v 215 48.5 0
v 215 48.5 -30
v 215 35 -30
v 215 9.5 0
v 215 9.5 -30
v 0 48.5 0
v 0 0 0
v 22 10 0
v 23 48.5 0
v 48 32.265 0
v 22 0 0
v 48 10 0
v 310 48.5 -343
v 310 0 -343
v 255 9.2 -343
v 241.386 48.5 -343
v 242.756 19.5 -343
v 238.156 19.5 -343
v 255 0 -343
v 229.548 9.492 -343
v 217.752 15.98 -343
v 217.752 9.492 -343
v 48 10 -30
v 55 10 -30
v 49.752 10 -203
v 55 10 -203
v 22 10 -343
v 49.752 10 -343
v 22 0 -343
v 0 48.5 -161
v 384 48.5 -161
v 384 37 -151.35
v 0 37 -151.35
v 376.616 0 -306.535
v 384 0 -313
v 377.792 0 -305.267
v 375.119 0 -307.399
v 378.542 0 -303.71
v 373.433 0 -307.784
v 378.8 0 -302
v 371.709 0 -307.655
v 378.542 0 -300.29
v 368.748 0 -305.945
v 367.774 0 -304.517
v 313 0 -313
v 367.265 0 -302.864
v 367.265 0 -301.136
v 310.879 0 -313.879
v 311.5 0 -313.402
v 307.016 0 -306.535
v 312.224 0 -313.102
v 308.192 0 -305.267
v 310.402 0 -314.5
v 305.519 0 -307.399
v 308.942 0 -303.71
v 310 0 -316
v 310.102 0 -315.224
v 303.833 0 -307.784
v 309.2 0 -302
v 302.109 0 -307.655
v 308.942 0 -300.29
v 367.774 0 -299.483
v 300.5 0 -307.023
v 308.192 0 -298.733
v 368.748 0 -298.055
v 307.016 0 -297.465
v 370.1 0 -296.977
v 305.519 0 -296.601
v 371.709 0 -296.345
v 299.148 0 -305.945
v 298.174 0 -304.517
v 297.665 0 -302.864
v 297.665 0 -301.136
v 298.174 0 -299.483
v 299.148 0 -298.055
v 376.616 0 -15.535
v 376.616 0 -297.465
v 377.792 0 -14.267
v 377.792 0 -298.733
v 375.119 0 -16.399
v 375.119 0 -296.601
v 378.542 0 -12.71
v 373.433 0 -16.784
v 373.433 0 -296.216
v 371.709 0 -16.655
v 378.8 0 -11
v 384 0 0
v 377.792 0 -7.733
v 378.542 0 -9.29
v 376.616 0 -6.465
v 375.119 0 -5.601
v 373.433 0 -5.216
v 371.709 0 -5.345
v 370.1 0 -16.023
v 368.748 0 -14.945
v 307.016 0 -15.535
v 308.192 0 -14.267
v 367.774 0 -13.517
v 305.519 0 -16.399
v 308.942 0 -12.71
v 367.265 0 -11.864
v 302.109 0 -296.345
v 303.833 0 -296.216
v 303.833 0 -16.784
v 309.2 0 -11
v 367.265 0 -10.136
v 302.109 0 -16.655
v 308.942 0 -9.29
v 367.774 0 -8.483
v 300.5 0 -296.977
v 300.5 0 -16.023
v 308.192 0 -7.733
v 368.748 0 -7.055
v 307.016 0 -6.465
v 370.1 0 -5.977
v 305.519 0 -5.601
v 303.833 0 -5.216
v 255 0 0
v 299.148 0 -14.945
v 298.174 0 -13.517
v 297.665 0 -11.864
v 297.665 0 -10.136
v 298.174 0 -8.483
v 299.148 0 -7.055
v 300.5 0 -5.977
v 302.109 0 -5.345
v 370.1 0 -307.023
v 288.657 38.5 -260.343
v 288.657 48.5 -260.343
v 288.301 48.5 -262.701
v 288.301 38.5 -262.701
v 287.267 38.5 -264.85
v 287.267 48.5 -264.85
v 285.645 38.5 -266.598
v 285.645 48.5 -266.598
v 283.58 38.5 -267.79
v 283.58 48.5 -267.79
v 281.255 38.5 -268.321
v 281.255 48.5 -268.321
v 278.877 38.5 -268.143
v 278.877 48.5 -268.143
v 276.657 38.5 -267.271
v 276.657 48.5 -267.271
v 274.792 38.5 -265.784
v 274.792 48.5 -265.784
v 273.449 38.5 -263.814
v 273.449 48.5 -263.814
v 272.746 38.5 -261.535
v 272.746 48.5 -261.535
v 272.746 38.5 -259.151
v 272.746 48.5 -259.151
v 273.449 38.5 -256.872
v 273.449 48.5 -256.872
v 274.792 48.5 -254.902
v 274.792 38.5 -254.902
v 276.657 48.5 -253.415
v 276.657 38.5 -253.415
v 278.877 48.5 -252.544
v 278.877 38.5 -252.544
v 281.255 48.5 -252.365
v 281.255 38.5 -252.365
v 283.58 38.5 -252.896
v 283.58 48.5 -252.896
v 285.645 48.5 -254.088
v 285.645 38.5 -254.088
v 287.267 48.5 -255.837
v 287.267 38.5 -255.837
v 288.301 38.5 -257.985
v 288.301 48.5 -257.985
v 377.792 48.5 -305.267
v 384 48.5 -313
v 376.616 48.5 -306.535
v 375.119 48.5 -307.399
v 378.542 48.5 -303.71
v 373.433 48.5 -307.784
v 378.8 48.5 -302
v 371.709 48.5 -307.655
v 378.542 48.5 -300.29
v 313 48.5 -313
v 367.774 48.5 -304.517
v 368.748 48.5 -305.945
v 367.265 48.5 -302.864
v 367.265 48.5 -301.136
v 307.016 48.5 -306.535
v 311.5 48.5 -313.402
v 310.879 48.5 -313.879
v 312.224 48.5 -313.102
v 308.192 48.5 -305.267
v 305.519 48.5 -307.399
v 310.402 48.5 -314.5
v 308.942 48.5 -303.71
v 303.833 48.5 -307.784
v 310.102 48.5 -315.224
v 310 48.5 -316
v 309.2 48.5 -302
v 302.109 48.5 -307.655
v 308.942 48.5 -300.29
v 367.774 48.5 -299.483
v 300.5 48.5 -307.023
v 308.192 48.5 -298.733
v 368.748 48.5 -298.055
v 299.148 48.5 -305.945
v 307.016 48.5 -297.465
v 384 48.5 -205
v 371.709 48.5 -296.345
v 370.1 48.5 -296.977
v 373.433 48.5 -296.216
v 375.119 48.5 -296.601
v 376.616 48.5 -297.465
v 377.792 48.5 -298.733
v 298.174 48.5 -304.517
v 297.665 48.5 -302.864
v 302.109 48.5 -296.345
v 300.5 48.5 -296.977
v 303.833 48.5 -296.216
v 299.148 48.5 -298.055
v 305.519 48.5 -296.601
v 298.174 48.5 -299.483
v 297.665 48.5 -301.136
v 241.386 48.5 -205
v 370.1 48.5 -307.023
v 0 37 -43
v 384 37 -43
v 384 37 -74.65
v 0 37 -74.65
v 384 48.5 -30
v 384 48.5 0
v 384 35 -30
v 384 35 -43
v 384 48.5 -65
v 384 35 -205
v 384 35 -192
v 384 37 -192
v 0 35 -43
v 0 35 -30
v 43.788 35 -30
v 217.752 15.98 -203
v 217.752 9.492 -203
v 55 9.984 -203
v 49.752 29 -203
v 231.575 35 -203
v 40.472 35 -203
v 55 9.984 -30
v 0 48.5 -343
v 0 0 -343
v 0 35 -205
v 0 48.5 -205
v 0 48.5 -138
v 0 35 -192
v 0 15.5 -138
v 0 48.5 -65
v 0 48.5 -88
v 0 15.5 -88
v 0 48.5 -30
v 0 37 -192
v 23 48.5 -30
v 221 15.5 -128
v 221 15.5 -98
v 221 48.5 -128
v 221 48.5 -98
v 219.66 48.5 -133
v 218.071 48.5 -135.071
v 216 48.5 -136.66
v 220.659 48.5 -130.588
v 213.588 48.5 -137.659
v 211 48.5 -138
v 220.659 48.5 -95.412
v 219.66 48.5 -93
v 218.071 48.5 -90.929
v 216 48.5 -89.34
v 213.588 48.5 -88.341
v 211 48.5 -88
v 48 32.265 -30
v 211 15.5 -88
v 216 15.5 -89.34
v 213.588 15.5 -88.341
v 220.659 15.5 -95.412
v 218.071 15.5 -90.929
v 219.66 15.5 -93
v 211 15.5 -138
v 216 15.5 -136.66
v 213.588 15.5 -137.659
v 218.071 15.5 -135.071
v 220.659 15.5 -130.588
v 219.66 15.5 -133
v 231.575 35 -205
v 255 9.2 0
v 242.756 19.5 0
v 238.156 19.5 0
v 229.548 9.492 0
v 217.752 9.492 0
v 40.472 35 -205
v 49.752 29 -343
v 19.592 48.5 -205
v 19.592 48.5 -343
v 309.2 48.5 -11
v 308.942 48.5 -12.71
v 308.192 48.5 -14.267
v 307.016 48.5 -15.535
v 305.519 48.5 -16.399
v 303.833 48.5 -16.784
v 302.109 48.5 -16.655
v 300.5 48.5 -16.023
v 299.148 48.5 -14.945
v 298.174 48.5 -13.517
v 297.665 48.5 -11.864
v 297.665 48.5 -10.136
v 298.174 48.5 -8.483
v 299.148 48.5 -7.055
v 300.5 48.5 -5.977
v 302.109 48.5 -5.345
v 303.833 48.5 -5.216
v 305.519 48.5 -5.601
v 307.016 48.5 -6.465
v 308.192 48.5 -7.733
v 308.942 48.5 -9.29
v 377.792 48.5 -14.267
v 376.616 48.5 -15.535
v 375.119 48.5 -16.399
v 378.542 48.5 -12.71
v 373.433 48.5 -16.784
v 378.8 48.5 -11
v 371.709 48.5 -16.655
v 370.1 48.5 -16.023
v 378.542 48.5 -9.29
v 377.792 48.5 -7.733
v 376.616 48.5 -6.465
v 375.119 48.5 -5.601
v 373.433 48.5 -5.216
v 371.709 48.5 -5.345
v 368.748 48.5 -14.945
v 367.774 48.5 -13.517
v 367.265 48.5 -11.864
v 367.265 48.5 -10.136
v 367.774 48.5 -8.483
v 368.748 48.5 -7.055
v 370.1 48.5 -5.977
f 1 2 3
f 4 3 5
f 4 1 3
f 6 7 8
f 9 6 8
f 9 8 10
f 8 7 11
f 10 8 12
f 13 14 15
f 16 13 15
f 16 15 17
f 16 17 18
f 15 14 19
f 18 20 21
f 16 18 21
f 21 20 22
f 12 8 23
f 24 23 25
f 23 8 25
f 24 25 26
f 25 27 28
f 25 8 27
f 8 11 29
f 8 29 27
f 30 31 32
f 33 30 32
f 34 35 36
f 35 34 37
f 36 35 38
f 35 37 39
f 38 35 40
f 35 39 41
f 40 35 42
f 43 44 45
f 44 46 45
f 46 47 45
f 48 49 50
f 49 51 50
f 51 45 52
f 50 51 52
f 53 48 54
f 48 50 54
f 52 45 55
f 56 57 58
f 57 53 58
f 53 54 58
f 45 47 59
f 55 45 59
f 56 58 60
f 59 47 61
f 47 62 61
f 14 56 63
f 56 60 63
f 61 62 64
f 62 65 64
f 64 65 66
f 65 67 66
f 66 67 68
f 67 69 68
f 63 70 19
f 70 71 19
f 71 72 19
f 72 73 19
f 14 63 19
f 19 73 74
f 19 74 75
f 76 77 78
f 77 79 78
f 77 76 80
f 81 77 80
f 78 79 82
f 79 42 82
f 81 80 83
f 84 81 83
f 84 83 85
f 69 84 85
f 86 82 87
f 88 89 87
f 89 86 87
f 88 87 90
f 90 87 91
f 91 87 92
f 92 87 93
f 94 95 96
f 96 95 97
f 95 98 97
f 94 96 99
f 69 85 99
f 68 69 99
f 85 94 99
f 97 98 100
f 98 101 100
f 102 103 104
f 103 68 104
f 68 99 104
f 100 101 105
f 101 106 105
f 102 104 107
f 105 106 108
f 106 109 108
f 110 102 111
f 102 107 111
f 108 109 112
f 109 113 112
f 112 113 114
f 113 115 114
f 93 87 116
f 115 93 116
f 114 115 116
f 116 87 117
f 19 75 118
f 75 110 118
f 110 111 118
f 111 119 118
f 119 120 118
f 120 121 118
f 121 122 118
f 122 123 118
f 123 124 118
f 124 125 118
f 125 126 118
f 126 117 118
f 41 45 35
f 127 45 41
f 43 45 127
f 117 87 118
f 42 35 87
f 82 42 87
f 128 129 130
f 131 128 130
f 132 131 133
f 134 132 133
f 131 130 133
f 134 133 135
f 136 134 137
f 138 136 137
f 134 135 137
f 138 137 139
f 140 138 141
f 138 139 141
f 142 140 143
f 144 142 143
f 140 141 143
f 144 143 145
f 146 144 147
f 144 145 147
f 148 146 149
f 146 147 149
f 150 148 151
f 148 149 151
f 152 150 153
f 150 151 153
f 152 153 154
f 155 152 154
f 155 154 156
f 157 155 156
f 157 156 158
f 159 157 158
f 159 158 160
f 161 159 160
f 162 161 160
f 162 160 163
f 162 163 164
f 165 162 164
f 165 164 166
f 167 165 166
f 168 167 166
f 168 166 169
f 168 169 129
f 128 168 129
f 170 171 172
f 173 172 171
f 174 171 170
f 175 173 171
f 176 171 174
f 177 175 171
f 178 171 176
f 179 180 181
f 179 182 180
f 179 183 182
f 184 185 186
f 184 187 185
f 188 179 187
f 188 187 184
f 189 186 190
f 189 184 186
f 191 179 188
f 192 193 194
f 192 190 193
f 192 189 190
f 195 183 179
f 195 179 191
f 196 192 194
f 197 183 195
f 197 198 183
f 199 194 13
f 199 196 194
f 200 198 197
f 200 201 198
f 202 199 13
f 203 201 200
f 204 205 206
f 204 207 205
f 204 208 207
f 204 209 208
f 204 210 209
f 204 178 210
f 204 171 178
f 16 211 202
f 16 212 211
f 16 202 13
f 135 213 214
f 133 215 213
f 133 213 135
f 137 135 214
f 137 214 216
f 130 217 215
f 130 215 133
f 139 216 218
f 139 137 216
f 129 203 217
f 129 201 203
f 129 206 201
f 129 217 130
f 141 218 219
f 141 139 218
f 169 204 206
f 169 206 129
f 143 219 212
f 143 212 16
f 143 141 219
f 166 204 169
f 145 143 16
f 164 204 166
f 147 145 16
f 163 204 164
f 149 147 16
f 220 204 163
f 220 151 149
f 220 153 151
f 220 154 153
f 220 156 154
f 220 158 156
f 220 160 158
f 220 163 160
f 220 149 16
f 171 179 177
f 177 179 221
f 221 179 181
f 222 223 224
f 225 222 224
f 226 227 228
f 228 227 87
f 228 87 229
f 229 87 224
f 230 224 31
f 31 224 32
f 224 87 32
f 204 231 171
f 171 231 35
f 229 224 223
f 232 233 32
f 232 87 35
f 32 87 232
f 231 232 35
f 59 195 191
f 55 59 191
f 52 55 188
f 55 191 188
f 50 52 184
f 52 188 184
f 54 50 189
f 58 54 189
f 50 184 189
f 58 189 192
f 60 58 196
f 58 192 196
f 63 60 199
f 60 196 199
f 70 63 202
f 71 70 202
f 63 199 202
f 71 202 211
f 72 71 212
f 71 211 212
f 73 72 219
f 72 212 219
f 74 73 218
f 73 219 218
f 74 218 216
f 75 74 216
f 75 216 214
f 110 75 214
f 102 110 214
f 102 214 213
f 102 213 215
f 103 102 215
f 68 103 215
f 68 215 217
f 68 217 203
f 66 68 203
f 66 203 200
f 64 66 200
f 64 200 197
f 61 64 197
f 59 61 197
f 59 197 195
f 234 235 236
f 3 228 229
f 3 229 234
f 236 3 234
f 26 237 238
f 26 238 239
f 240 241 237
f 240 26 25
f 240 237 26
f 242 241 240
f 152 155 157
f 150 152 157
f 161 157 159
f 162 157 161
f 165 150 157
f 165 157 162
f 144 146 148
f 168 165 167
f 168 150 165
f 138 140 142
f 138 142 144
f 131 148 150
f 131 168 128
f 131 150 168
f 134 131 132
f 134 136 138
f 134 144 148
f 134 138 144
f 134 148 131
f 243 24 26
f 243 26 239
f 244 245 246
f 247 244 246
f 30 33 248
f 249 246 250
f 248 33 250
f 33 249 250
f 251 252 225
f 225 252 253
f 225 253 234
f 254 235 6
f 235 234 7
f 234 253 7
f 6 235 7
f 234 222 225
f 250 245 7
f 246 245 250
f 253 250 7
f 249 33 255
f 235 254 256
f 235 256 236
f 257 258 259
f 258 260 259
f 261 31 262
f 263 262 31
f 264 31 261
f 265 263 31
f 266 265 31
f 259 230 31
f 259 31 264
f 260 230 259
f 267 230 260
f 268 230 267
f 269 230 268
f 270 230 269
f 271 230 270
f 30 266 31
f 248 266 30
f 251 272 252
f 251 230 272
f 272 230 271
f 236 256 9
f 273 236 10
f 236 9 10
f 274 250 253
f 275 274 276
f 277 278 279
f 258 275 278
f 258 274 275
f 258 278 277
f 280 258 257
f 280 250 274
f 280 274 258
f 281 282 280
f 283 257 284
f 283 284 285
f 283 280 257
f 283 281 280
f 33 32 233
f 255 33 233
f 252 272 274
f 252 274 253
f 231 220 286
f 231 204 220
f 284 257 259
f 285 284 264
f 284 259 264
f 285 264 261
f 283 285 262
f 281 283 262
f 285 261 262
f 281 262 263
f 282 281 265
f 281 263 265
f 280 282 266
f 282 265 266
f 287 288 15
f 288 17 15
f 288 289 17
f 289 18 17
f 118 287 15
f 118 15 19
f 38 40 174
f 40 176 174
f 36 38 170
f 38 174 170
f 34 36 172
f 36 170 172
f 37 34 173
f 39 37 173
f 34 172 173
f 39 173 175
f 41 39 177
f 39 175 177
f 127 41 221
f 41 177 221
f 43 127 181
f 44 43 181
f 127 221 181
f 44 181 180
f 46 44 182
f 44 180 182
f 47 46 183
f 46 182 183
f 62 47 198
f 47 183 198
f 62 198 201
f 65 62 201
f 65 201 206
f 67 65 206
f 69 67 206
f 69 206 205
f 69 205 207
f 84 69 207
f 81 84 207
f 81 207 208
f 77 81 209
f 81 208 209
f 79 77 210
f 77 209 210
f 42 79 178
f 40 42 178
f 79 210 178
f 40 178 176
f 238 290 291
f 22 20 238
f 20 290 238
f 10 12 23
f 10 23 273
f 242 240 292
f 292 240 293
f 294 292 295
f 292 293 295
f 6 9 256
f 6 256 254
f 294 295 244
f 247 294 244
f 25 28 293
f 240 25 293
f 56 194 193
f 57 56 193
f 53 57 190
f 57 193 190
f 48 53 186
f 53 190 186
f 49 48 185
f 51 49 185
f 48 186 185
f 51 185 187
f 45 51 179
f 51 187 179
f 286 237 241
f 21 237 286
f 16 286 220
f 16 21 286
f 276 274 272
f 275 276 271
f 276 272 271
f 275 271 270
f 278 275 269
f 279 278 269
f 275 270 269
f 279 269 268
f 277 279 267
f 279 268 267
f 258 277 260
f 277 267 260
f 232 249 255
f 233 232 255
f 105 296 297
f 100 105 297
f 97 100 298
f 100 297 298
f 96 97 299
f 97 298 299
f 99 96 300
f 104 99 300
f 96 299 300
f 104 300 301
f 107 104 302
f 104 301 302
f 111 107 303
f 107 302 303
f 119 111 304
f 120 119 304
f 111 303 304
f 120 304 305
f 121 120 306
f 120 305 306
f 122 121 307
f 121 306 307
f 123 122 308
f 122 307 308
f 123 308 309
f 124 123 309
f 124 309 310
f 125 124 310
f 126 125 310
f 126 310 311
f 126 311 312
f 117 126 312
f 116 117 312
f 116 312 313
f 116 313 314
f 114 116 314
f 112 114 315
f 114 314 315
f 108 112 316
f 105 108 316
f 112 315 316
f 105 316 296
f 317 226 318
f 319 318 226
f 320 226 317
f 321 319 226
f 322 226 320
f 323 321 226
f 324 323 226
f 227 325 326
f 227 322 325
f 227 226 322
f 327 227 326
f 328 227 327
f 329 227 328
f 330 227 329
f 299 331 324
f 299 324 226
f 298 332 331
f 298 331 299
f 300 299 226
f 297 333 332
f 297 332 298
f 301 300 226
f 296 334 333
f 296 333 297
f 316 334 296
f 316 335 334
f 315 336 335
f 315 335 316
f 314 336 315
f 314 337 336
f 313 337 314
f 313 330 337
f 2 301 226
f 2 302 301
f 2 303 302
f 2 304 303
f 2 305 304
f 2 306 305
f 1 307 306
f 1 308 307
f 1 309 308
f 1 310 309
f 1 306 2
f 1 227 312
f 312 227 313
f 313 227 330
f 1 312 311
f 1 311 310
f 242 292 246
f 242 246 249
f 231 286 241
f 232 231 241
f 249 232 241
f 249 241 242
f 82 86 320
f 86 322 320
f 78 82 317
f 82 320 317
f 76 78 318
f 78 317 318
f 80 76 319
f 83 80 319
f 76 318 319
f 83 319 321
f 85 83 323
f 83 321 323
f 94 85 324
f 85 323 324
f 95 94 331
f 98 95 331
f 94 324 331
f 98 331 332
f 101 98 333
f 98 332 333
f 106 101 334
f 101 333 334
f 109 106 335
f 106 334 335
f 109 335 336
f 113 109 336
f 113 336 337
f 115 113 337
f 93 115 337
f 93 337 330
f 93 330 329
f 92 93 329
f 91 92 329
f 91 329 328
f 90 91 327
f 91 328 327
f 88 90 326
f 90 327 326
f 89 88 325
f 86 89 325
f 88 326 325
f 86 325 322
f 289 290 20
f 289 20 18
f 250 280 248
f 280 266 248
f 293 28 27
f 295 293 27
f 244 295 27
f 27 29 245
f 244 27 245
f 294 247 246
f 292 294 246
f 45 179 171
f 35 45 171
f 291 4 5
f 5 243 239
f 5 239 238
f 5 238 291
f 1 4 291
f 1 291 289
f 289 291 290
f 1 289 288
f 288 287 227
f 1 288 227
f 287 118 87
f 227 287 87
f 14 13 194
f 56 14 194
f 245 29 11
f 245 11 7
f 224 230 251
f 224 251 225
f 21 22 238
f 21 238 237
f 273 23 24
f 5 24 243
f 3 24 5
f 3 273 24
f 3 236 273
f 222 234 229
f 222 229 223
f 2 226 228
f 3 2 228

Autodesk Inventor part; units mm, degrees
ref_plane "YZ Plane" through (0, 0, 0) normal (1, 0, 0) x (0, 1, 0)
ref_plane "XZ Plane" through (0, 0, 0) normal (0, 1, 0) x (-1, 0, 0)
ref_plane "XY Plane" through (0, 0, 0) normal (0, 0, 1) x (1, 0, 0)
sketch "Sketch1" plane through (0, 0, 0) normal (0, 1, 0) x (-1, 0, 0)
  line L0 (0, 0) -> (-384, 0)
  line L1 (-384, 0) -> (-384, -343)
  line L2 (-384, -343) -> (0, -343)
  line L3 (0, -343) -> (0, 0)
  dimension "d0" = 384
  dimension "d1" = 343
extrude "Extrusion1" add sketch "Sketch1" along normal blind 48.5
sketch "Sketch3" plane through (384, 0, 0) normal (1, 0, 0) x (0, 0, -1)
  line L0 (0, 0) -> (343, 0) projected
  line L1 (0, 0) -> (0, 48.5) projected
  line L2 (343, 0) -> (343, 48.5) projected
  line L3 (30, 48.5) -> (65, 48.5)
  line L4 (30, 48.5) -> (30, 37)
  line L5 (65, 48.5) -> (74.6496, 37)
  line L6 (43, 37) -> (74.6496, 37)
  line L7 (30, 37) -> (30, 35)
  line L8 (30, 35) -> (43, 35)
  line L9 (43, 35) -> (43, 37)
  dimension "d23" = 35
  dimension "d37" = 2
  dimension "d38" = 13
extrude "Extrusion2" cut sketch "Sketch3" against normal through all
sketch "Sketch7" plane through (384, 0, 0) normal (1, 0, 0) x (0, 0, -1)
  line L0 (65, 48.5) -> (343, 48.5) projected
  line L1 (65, 48.5) -> (161, 48.5)
  line L2 (161, 48.5) -> (174.2196, 48.5) construction
  line L3 (161, 48.5) -> (205, 48.5)
  line L4 (0, 0) -> (343, 0) projected
  line L5 (151.3504, 37) -> (192, 37)
  line L6 (205, 37) -> (205, 48.5)
  line L7 (161, 48.5) -> (151.3504, 37)
  line L8 (161, 48.5) -> (183.0653, 48.5) construction
  line L9 (205, 37) -> (205, 35)
  line L10 (205, 35) -> (192, 35)
  line L11 (192, 35) -> (192, 37)
  dimension "d27" = 96
  dimension "d29" = 44
  dimension "d32" = 130
extrude "Extrusion3" cut sketch "Sketch7" against normal through all
sketch "Sketch8" plane through (0, 48.5, 0) normal (0, 1, 0) x (1, 0, 0)
  line L0 (310, 343) -> (310, 316)
  line L1 (313, 313) -> (384, 313)
  line L2 (384, 0) -> (384, 343) projected
  line L3 (384, 313) -> (384, 343)
  line L4 (384, 343) -> (310, 343)
  line L5 (384, 343) -> (0, 343) projected
  arc A0 (310, 316) -> (313, 313) centre (313, 316) ccw
  point P0 (0, 0)
  point P1 (310, 313)
  dimension "d43" = 30
  dimension "d46" = 3
extrude "Extrusion4" cut sketch "Sketch8" against normal through all
sketch "Sketch12" plane through (0, 48.5, 0) normal (0, 1, 0) x (1, 0, 0)
  line L0 (221, 113) -> (221, 128)
  line L1 (211, 88) -> (0, 88)
  line L2 (211, 138) -> (0, 138)
  arc A0 (211, 88) -> (221, 98) centre (211, 98) ccw
  arc A1 (221, 128) -> (211, 138) centre (211, 128) ccw
  line L3 (221, 98) -> (221, 113)
  line L4 (0, 88) -> (0, 138)
  point P0 (384, 161)
  point P1 (221, 88)
  dimension "d72" = 10
extrude "Extrusion8" cut sketch "Sketch12" against normal blind 33
sketch "Sketch28" plane through (0, 48.5, 0) normal (0, 1, 0) x (1, 0, 0)
  circle A0 centre (373, 302) radius 5.8
  circle A1 centre (303.4, 302) radius 5.8
  circle A2 centre (373, 11) radius 5.8
  circle A3 centre (303.4, 11) radius 5.8
  point P0 (0, 0)
  point P1 (384, 313)
  point P2 (384, 0)
  dimension "d146" = 11.6
  dimension "d149" = 11.6
  dimension "d152" = 11.6
  dimension "d155" = 11.6
extrude "Extrusion19" cut sketch "Sketch28" against normal through all
sketch "Sketch29" plane through (0, 48.5, 0) normal (0, 0, 1) x (1, 0, 0)
  line L0 (0, -48.5) -> (0, 0) projected
  line L1 (0, 0) -> (384, 0) projected
  line L2 (23, 0) -> (48, -16.2352) projected
  line L3 (23, 0) -> (48, -16.2352)
  line L4 (0, -48.5) -> (384, -48.5) projected
  line L5 (23, 0) -> (48, 0)
  line L6 (48, -16.2352) -> (48, 0)
  line L7 (384, -13.5) -> (0, -13.5) projected
  point P0 (48, -48.5)
  point P1 (215, -48.5)
  point P2 (20, -48.5)
extrude "Extrusion20" cut sketch "Sketch29" against normal up to surface (30 mm away) contours L7 L6 L2 | L2 L1 L6 L7
sketch "Sketch30" plane through (0, 0, 0) normal (0, 0, 1) x (1, 0, 0)
  line L0 (48, 48.5) -> (215, 48.5)
  line L1 (215, 48.5) -> (215, 0)
  line L2 (215, 0) -> (48, 0)
  line L3 (48, 0) -> (48, 48.5)
  point P0 (0, 0)
  point P1 (48, 0)
extrude "Extrusion21" cut sketch "Sketch30" against normal up to surface (30 mm away)
sketch "Sketch32" plane through (0, 48.5, 0) normal (0, 1, 0) x (1, 0, 0)
  line L0 (275, 266) -> (283, 266) construction
  circle A0 centre (280.6569, 260.3431) radius 8
  point P0 (0, 0)
  point P1 (255, 343)
  dimension "d168" = 16
extrude "Extrusion22" cut sketch "Sketch32" against normal blind 10
sketch "Sketch36" plane through (0, 0, -343) normal (0, 0, -1) x (-1, 0, 0)
  line L0 (-255, 0) -> (-243.6863, 11.3137)
  line L1 (-255, 0) -> (-239, 0) construction
  line L2 (-243.6863, 11.3137) -> (-239.0863, 11.3137)
  line L3 (-239.0863, 11.3137) -> (-229.7525, 1.9799)
  line L4 (-239.0863, 11.3137) -> (-225.8863, 11.3137) construction
  line L5 (-229.7525, 1.9799) -> (-217.7525, 1.9799)
  line L6 (-22, 0) -> (-22, 10)
  line L7 (-22, 10) -> (-55, 10)
  line L8 (-217.7525, 1.9799) -> (-217.7525, 0)
  line L9 (-55, 10) -> (-55, 0)
  line L10 (-255, 0) -> (-217.7525, 0)
  line L11 (-310, 0) -> (0, 0) projected
  line L12 (-55, 0) -> (-22, 0)
  dimension "d209" = 16
  dimension "d210" = 45
  dimension "d211" = 4.6
  dimension "d214" = 13.2
  dimension "d215" = 45
  dimension "d216" = 12
  dimension "d224" = 22
  dimension "d225" = 10
extrude "Extrusion23" cut sketch "Sketch36" against normal through all
sketch "Sketch37" plane through (0, 0, -343) normal (0, 0, -1) x (-1, 0, 0)
  line L0 (-217.7525, 1.9799) -> (-217.7525, 15.9799)
  line L1 (-217.7525, 15.9799) -> (-241.3863, 48.5)
  line L2 (-241.3863, 48.5) -> (-19.5919, 48.5)
  line L3 (-211, 48.5) -> (0, 48.5) projected
  line L4 (-48, 10) -> (-55, 10) projected
  line L5 (-217.7525, 0) -> (-217.7525, 1.9799) projected
  line L6 (-217.7525, 1.9799) -> (-217.7525, 0)
  line L7 (-215, 0) -> (-55, 0) projected
  line L8 (-217.7525, 0) -> (-55, 0)
  line L9 (-55, 10) -> (-55, 0) projected
  line L10 (-55, 0) -> (-55, 10)
  line L11 (-217.7525, 15.9799) -> (-49.7525, 15.9799) construction
  line L12 (-55, 10) -> (-49.7525, 10)
  line L13 (-49.7525, 10) -> (-49.7525, 29)
  line L14 (-49.7525, 29) -> (-19.5919, 48.5)
  line L15 (0, 48.5) -> (-23, 48.5) projected
  point P0 (0, 0)
  dimension "d229" = 14
  dimension "d232" = 19
extrude "Extrusion24" cut sketch "Sketch37" against normal blind 140
sketch "Sketch38" plane through (0, 0, -203) normal (0, 0, -1) x (-1, 0, 0)
  line L0 (-49.7525, 29) -> (-49.7525, 10) projected
  line L1 (-55, 9.9841) -> (-217.7525, 9.4921)
  line L2 (-217.7525, 1.9799) -> (-217.7525, 15.9799) projected
  line L3 (-217.7525, 0) -> (-217.7525, 1.9799) projected
  line L4 (-217.7525, 9.4921) -> (-217.7525, 0)
  line L5 (-215, 0) -> (-55, 0) projected
  line L6 (-217.7525, 0) -> (-55, 0)
  line L7 (-55, 10) -> (-55, 0) projected
  line L8 (-55, 0) -> (-55, 10)
  line L9 (-55, 10) -> (-55, 0)
  point P0 (0, 0)
extrude "Extrusion25" cut sketch "Sketch38" against normal through all
sketch "Sketch40" plane through (0, 0, -343) normal (0, 0, -1) x (-1, 0, 0)
  line L0 (-229.5482, 9.4921) -> (-238.1559, 19.4995)
  line L1 (-229.5482, 9.4921) -> (-216.3482, 9.4921) construction
  line L2 (-238.1559, 19.4995) -> (-242.7559, 19.4995)
  line L3 (-242.7559, 19.4995) -> (-255, 9.1999)
  line L4 (-242.7559, 19.4995) -> (-226.7559, 19.4995) construction
  line L5 (-243.6863, 11.3137) -> (-255, 0) projected
  line L6 (-255, 9.1999) -> (-255, 0)
  line L7 (-229.5482, 9.4921) -> (-217.7525, 9.4921)
  line L8 (-217.7525, 9.4921) -> (-217.7525, 1.9799) projected
  line L9 (-217.7525, 9.4921) -> (-217.7525, 1.9799)
  line L10 (-217.7525, 1.9799) -> (-217.7525, 9.4921)
  line L11 (-217.7525, 1.9799) -> (-229.7525, 1.9799)
  line L12 (-229.7525, 1.9799) -> (-239.0863, 11.3137) projected
  line L13 (-229.7525, 1.9799) -> (-239.0863, 11.3137)
  line L14 (-239.0863, 11.3137) -> (-243.6863, 11.3137)
  line L15 (-255, 0) -> (-243.6863, 11.3137)
  dimension "d240" = 13.2
  dimension "d242" = 4.6
  dimension "d243" = 16
extrude "Extrusion26" cut sketch "Sketch40" against normal through all
properties part number "saddle" material "Iron, Cast"
